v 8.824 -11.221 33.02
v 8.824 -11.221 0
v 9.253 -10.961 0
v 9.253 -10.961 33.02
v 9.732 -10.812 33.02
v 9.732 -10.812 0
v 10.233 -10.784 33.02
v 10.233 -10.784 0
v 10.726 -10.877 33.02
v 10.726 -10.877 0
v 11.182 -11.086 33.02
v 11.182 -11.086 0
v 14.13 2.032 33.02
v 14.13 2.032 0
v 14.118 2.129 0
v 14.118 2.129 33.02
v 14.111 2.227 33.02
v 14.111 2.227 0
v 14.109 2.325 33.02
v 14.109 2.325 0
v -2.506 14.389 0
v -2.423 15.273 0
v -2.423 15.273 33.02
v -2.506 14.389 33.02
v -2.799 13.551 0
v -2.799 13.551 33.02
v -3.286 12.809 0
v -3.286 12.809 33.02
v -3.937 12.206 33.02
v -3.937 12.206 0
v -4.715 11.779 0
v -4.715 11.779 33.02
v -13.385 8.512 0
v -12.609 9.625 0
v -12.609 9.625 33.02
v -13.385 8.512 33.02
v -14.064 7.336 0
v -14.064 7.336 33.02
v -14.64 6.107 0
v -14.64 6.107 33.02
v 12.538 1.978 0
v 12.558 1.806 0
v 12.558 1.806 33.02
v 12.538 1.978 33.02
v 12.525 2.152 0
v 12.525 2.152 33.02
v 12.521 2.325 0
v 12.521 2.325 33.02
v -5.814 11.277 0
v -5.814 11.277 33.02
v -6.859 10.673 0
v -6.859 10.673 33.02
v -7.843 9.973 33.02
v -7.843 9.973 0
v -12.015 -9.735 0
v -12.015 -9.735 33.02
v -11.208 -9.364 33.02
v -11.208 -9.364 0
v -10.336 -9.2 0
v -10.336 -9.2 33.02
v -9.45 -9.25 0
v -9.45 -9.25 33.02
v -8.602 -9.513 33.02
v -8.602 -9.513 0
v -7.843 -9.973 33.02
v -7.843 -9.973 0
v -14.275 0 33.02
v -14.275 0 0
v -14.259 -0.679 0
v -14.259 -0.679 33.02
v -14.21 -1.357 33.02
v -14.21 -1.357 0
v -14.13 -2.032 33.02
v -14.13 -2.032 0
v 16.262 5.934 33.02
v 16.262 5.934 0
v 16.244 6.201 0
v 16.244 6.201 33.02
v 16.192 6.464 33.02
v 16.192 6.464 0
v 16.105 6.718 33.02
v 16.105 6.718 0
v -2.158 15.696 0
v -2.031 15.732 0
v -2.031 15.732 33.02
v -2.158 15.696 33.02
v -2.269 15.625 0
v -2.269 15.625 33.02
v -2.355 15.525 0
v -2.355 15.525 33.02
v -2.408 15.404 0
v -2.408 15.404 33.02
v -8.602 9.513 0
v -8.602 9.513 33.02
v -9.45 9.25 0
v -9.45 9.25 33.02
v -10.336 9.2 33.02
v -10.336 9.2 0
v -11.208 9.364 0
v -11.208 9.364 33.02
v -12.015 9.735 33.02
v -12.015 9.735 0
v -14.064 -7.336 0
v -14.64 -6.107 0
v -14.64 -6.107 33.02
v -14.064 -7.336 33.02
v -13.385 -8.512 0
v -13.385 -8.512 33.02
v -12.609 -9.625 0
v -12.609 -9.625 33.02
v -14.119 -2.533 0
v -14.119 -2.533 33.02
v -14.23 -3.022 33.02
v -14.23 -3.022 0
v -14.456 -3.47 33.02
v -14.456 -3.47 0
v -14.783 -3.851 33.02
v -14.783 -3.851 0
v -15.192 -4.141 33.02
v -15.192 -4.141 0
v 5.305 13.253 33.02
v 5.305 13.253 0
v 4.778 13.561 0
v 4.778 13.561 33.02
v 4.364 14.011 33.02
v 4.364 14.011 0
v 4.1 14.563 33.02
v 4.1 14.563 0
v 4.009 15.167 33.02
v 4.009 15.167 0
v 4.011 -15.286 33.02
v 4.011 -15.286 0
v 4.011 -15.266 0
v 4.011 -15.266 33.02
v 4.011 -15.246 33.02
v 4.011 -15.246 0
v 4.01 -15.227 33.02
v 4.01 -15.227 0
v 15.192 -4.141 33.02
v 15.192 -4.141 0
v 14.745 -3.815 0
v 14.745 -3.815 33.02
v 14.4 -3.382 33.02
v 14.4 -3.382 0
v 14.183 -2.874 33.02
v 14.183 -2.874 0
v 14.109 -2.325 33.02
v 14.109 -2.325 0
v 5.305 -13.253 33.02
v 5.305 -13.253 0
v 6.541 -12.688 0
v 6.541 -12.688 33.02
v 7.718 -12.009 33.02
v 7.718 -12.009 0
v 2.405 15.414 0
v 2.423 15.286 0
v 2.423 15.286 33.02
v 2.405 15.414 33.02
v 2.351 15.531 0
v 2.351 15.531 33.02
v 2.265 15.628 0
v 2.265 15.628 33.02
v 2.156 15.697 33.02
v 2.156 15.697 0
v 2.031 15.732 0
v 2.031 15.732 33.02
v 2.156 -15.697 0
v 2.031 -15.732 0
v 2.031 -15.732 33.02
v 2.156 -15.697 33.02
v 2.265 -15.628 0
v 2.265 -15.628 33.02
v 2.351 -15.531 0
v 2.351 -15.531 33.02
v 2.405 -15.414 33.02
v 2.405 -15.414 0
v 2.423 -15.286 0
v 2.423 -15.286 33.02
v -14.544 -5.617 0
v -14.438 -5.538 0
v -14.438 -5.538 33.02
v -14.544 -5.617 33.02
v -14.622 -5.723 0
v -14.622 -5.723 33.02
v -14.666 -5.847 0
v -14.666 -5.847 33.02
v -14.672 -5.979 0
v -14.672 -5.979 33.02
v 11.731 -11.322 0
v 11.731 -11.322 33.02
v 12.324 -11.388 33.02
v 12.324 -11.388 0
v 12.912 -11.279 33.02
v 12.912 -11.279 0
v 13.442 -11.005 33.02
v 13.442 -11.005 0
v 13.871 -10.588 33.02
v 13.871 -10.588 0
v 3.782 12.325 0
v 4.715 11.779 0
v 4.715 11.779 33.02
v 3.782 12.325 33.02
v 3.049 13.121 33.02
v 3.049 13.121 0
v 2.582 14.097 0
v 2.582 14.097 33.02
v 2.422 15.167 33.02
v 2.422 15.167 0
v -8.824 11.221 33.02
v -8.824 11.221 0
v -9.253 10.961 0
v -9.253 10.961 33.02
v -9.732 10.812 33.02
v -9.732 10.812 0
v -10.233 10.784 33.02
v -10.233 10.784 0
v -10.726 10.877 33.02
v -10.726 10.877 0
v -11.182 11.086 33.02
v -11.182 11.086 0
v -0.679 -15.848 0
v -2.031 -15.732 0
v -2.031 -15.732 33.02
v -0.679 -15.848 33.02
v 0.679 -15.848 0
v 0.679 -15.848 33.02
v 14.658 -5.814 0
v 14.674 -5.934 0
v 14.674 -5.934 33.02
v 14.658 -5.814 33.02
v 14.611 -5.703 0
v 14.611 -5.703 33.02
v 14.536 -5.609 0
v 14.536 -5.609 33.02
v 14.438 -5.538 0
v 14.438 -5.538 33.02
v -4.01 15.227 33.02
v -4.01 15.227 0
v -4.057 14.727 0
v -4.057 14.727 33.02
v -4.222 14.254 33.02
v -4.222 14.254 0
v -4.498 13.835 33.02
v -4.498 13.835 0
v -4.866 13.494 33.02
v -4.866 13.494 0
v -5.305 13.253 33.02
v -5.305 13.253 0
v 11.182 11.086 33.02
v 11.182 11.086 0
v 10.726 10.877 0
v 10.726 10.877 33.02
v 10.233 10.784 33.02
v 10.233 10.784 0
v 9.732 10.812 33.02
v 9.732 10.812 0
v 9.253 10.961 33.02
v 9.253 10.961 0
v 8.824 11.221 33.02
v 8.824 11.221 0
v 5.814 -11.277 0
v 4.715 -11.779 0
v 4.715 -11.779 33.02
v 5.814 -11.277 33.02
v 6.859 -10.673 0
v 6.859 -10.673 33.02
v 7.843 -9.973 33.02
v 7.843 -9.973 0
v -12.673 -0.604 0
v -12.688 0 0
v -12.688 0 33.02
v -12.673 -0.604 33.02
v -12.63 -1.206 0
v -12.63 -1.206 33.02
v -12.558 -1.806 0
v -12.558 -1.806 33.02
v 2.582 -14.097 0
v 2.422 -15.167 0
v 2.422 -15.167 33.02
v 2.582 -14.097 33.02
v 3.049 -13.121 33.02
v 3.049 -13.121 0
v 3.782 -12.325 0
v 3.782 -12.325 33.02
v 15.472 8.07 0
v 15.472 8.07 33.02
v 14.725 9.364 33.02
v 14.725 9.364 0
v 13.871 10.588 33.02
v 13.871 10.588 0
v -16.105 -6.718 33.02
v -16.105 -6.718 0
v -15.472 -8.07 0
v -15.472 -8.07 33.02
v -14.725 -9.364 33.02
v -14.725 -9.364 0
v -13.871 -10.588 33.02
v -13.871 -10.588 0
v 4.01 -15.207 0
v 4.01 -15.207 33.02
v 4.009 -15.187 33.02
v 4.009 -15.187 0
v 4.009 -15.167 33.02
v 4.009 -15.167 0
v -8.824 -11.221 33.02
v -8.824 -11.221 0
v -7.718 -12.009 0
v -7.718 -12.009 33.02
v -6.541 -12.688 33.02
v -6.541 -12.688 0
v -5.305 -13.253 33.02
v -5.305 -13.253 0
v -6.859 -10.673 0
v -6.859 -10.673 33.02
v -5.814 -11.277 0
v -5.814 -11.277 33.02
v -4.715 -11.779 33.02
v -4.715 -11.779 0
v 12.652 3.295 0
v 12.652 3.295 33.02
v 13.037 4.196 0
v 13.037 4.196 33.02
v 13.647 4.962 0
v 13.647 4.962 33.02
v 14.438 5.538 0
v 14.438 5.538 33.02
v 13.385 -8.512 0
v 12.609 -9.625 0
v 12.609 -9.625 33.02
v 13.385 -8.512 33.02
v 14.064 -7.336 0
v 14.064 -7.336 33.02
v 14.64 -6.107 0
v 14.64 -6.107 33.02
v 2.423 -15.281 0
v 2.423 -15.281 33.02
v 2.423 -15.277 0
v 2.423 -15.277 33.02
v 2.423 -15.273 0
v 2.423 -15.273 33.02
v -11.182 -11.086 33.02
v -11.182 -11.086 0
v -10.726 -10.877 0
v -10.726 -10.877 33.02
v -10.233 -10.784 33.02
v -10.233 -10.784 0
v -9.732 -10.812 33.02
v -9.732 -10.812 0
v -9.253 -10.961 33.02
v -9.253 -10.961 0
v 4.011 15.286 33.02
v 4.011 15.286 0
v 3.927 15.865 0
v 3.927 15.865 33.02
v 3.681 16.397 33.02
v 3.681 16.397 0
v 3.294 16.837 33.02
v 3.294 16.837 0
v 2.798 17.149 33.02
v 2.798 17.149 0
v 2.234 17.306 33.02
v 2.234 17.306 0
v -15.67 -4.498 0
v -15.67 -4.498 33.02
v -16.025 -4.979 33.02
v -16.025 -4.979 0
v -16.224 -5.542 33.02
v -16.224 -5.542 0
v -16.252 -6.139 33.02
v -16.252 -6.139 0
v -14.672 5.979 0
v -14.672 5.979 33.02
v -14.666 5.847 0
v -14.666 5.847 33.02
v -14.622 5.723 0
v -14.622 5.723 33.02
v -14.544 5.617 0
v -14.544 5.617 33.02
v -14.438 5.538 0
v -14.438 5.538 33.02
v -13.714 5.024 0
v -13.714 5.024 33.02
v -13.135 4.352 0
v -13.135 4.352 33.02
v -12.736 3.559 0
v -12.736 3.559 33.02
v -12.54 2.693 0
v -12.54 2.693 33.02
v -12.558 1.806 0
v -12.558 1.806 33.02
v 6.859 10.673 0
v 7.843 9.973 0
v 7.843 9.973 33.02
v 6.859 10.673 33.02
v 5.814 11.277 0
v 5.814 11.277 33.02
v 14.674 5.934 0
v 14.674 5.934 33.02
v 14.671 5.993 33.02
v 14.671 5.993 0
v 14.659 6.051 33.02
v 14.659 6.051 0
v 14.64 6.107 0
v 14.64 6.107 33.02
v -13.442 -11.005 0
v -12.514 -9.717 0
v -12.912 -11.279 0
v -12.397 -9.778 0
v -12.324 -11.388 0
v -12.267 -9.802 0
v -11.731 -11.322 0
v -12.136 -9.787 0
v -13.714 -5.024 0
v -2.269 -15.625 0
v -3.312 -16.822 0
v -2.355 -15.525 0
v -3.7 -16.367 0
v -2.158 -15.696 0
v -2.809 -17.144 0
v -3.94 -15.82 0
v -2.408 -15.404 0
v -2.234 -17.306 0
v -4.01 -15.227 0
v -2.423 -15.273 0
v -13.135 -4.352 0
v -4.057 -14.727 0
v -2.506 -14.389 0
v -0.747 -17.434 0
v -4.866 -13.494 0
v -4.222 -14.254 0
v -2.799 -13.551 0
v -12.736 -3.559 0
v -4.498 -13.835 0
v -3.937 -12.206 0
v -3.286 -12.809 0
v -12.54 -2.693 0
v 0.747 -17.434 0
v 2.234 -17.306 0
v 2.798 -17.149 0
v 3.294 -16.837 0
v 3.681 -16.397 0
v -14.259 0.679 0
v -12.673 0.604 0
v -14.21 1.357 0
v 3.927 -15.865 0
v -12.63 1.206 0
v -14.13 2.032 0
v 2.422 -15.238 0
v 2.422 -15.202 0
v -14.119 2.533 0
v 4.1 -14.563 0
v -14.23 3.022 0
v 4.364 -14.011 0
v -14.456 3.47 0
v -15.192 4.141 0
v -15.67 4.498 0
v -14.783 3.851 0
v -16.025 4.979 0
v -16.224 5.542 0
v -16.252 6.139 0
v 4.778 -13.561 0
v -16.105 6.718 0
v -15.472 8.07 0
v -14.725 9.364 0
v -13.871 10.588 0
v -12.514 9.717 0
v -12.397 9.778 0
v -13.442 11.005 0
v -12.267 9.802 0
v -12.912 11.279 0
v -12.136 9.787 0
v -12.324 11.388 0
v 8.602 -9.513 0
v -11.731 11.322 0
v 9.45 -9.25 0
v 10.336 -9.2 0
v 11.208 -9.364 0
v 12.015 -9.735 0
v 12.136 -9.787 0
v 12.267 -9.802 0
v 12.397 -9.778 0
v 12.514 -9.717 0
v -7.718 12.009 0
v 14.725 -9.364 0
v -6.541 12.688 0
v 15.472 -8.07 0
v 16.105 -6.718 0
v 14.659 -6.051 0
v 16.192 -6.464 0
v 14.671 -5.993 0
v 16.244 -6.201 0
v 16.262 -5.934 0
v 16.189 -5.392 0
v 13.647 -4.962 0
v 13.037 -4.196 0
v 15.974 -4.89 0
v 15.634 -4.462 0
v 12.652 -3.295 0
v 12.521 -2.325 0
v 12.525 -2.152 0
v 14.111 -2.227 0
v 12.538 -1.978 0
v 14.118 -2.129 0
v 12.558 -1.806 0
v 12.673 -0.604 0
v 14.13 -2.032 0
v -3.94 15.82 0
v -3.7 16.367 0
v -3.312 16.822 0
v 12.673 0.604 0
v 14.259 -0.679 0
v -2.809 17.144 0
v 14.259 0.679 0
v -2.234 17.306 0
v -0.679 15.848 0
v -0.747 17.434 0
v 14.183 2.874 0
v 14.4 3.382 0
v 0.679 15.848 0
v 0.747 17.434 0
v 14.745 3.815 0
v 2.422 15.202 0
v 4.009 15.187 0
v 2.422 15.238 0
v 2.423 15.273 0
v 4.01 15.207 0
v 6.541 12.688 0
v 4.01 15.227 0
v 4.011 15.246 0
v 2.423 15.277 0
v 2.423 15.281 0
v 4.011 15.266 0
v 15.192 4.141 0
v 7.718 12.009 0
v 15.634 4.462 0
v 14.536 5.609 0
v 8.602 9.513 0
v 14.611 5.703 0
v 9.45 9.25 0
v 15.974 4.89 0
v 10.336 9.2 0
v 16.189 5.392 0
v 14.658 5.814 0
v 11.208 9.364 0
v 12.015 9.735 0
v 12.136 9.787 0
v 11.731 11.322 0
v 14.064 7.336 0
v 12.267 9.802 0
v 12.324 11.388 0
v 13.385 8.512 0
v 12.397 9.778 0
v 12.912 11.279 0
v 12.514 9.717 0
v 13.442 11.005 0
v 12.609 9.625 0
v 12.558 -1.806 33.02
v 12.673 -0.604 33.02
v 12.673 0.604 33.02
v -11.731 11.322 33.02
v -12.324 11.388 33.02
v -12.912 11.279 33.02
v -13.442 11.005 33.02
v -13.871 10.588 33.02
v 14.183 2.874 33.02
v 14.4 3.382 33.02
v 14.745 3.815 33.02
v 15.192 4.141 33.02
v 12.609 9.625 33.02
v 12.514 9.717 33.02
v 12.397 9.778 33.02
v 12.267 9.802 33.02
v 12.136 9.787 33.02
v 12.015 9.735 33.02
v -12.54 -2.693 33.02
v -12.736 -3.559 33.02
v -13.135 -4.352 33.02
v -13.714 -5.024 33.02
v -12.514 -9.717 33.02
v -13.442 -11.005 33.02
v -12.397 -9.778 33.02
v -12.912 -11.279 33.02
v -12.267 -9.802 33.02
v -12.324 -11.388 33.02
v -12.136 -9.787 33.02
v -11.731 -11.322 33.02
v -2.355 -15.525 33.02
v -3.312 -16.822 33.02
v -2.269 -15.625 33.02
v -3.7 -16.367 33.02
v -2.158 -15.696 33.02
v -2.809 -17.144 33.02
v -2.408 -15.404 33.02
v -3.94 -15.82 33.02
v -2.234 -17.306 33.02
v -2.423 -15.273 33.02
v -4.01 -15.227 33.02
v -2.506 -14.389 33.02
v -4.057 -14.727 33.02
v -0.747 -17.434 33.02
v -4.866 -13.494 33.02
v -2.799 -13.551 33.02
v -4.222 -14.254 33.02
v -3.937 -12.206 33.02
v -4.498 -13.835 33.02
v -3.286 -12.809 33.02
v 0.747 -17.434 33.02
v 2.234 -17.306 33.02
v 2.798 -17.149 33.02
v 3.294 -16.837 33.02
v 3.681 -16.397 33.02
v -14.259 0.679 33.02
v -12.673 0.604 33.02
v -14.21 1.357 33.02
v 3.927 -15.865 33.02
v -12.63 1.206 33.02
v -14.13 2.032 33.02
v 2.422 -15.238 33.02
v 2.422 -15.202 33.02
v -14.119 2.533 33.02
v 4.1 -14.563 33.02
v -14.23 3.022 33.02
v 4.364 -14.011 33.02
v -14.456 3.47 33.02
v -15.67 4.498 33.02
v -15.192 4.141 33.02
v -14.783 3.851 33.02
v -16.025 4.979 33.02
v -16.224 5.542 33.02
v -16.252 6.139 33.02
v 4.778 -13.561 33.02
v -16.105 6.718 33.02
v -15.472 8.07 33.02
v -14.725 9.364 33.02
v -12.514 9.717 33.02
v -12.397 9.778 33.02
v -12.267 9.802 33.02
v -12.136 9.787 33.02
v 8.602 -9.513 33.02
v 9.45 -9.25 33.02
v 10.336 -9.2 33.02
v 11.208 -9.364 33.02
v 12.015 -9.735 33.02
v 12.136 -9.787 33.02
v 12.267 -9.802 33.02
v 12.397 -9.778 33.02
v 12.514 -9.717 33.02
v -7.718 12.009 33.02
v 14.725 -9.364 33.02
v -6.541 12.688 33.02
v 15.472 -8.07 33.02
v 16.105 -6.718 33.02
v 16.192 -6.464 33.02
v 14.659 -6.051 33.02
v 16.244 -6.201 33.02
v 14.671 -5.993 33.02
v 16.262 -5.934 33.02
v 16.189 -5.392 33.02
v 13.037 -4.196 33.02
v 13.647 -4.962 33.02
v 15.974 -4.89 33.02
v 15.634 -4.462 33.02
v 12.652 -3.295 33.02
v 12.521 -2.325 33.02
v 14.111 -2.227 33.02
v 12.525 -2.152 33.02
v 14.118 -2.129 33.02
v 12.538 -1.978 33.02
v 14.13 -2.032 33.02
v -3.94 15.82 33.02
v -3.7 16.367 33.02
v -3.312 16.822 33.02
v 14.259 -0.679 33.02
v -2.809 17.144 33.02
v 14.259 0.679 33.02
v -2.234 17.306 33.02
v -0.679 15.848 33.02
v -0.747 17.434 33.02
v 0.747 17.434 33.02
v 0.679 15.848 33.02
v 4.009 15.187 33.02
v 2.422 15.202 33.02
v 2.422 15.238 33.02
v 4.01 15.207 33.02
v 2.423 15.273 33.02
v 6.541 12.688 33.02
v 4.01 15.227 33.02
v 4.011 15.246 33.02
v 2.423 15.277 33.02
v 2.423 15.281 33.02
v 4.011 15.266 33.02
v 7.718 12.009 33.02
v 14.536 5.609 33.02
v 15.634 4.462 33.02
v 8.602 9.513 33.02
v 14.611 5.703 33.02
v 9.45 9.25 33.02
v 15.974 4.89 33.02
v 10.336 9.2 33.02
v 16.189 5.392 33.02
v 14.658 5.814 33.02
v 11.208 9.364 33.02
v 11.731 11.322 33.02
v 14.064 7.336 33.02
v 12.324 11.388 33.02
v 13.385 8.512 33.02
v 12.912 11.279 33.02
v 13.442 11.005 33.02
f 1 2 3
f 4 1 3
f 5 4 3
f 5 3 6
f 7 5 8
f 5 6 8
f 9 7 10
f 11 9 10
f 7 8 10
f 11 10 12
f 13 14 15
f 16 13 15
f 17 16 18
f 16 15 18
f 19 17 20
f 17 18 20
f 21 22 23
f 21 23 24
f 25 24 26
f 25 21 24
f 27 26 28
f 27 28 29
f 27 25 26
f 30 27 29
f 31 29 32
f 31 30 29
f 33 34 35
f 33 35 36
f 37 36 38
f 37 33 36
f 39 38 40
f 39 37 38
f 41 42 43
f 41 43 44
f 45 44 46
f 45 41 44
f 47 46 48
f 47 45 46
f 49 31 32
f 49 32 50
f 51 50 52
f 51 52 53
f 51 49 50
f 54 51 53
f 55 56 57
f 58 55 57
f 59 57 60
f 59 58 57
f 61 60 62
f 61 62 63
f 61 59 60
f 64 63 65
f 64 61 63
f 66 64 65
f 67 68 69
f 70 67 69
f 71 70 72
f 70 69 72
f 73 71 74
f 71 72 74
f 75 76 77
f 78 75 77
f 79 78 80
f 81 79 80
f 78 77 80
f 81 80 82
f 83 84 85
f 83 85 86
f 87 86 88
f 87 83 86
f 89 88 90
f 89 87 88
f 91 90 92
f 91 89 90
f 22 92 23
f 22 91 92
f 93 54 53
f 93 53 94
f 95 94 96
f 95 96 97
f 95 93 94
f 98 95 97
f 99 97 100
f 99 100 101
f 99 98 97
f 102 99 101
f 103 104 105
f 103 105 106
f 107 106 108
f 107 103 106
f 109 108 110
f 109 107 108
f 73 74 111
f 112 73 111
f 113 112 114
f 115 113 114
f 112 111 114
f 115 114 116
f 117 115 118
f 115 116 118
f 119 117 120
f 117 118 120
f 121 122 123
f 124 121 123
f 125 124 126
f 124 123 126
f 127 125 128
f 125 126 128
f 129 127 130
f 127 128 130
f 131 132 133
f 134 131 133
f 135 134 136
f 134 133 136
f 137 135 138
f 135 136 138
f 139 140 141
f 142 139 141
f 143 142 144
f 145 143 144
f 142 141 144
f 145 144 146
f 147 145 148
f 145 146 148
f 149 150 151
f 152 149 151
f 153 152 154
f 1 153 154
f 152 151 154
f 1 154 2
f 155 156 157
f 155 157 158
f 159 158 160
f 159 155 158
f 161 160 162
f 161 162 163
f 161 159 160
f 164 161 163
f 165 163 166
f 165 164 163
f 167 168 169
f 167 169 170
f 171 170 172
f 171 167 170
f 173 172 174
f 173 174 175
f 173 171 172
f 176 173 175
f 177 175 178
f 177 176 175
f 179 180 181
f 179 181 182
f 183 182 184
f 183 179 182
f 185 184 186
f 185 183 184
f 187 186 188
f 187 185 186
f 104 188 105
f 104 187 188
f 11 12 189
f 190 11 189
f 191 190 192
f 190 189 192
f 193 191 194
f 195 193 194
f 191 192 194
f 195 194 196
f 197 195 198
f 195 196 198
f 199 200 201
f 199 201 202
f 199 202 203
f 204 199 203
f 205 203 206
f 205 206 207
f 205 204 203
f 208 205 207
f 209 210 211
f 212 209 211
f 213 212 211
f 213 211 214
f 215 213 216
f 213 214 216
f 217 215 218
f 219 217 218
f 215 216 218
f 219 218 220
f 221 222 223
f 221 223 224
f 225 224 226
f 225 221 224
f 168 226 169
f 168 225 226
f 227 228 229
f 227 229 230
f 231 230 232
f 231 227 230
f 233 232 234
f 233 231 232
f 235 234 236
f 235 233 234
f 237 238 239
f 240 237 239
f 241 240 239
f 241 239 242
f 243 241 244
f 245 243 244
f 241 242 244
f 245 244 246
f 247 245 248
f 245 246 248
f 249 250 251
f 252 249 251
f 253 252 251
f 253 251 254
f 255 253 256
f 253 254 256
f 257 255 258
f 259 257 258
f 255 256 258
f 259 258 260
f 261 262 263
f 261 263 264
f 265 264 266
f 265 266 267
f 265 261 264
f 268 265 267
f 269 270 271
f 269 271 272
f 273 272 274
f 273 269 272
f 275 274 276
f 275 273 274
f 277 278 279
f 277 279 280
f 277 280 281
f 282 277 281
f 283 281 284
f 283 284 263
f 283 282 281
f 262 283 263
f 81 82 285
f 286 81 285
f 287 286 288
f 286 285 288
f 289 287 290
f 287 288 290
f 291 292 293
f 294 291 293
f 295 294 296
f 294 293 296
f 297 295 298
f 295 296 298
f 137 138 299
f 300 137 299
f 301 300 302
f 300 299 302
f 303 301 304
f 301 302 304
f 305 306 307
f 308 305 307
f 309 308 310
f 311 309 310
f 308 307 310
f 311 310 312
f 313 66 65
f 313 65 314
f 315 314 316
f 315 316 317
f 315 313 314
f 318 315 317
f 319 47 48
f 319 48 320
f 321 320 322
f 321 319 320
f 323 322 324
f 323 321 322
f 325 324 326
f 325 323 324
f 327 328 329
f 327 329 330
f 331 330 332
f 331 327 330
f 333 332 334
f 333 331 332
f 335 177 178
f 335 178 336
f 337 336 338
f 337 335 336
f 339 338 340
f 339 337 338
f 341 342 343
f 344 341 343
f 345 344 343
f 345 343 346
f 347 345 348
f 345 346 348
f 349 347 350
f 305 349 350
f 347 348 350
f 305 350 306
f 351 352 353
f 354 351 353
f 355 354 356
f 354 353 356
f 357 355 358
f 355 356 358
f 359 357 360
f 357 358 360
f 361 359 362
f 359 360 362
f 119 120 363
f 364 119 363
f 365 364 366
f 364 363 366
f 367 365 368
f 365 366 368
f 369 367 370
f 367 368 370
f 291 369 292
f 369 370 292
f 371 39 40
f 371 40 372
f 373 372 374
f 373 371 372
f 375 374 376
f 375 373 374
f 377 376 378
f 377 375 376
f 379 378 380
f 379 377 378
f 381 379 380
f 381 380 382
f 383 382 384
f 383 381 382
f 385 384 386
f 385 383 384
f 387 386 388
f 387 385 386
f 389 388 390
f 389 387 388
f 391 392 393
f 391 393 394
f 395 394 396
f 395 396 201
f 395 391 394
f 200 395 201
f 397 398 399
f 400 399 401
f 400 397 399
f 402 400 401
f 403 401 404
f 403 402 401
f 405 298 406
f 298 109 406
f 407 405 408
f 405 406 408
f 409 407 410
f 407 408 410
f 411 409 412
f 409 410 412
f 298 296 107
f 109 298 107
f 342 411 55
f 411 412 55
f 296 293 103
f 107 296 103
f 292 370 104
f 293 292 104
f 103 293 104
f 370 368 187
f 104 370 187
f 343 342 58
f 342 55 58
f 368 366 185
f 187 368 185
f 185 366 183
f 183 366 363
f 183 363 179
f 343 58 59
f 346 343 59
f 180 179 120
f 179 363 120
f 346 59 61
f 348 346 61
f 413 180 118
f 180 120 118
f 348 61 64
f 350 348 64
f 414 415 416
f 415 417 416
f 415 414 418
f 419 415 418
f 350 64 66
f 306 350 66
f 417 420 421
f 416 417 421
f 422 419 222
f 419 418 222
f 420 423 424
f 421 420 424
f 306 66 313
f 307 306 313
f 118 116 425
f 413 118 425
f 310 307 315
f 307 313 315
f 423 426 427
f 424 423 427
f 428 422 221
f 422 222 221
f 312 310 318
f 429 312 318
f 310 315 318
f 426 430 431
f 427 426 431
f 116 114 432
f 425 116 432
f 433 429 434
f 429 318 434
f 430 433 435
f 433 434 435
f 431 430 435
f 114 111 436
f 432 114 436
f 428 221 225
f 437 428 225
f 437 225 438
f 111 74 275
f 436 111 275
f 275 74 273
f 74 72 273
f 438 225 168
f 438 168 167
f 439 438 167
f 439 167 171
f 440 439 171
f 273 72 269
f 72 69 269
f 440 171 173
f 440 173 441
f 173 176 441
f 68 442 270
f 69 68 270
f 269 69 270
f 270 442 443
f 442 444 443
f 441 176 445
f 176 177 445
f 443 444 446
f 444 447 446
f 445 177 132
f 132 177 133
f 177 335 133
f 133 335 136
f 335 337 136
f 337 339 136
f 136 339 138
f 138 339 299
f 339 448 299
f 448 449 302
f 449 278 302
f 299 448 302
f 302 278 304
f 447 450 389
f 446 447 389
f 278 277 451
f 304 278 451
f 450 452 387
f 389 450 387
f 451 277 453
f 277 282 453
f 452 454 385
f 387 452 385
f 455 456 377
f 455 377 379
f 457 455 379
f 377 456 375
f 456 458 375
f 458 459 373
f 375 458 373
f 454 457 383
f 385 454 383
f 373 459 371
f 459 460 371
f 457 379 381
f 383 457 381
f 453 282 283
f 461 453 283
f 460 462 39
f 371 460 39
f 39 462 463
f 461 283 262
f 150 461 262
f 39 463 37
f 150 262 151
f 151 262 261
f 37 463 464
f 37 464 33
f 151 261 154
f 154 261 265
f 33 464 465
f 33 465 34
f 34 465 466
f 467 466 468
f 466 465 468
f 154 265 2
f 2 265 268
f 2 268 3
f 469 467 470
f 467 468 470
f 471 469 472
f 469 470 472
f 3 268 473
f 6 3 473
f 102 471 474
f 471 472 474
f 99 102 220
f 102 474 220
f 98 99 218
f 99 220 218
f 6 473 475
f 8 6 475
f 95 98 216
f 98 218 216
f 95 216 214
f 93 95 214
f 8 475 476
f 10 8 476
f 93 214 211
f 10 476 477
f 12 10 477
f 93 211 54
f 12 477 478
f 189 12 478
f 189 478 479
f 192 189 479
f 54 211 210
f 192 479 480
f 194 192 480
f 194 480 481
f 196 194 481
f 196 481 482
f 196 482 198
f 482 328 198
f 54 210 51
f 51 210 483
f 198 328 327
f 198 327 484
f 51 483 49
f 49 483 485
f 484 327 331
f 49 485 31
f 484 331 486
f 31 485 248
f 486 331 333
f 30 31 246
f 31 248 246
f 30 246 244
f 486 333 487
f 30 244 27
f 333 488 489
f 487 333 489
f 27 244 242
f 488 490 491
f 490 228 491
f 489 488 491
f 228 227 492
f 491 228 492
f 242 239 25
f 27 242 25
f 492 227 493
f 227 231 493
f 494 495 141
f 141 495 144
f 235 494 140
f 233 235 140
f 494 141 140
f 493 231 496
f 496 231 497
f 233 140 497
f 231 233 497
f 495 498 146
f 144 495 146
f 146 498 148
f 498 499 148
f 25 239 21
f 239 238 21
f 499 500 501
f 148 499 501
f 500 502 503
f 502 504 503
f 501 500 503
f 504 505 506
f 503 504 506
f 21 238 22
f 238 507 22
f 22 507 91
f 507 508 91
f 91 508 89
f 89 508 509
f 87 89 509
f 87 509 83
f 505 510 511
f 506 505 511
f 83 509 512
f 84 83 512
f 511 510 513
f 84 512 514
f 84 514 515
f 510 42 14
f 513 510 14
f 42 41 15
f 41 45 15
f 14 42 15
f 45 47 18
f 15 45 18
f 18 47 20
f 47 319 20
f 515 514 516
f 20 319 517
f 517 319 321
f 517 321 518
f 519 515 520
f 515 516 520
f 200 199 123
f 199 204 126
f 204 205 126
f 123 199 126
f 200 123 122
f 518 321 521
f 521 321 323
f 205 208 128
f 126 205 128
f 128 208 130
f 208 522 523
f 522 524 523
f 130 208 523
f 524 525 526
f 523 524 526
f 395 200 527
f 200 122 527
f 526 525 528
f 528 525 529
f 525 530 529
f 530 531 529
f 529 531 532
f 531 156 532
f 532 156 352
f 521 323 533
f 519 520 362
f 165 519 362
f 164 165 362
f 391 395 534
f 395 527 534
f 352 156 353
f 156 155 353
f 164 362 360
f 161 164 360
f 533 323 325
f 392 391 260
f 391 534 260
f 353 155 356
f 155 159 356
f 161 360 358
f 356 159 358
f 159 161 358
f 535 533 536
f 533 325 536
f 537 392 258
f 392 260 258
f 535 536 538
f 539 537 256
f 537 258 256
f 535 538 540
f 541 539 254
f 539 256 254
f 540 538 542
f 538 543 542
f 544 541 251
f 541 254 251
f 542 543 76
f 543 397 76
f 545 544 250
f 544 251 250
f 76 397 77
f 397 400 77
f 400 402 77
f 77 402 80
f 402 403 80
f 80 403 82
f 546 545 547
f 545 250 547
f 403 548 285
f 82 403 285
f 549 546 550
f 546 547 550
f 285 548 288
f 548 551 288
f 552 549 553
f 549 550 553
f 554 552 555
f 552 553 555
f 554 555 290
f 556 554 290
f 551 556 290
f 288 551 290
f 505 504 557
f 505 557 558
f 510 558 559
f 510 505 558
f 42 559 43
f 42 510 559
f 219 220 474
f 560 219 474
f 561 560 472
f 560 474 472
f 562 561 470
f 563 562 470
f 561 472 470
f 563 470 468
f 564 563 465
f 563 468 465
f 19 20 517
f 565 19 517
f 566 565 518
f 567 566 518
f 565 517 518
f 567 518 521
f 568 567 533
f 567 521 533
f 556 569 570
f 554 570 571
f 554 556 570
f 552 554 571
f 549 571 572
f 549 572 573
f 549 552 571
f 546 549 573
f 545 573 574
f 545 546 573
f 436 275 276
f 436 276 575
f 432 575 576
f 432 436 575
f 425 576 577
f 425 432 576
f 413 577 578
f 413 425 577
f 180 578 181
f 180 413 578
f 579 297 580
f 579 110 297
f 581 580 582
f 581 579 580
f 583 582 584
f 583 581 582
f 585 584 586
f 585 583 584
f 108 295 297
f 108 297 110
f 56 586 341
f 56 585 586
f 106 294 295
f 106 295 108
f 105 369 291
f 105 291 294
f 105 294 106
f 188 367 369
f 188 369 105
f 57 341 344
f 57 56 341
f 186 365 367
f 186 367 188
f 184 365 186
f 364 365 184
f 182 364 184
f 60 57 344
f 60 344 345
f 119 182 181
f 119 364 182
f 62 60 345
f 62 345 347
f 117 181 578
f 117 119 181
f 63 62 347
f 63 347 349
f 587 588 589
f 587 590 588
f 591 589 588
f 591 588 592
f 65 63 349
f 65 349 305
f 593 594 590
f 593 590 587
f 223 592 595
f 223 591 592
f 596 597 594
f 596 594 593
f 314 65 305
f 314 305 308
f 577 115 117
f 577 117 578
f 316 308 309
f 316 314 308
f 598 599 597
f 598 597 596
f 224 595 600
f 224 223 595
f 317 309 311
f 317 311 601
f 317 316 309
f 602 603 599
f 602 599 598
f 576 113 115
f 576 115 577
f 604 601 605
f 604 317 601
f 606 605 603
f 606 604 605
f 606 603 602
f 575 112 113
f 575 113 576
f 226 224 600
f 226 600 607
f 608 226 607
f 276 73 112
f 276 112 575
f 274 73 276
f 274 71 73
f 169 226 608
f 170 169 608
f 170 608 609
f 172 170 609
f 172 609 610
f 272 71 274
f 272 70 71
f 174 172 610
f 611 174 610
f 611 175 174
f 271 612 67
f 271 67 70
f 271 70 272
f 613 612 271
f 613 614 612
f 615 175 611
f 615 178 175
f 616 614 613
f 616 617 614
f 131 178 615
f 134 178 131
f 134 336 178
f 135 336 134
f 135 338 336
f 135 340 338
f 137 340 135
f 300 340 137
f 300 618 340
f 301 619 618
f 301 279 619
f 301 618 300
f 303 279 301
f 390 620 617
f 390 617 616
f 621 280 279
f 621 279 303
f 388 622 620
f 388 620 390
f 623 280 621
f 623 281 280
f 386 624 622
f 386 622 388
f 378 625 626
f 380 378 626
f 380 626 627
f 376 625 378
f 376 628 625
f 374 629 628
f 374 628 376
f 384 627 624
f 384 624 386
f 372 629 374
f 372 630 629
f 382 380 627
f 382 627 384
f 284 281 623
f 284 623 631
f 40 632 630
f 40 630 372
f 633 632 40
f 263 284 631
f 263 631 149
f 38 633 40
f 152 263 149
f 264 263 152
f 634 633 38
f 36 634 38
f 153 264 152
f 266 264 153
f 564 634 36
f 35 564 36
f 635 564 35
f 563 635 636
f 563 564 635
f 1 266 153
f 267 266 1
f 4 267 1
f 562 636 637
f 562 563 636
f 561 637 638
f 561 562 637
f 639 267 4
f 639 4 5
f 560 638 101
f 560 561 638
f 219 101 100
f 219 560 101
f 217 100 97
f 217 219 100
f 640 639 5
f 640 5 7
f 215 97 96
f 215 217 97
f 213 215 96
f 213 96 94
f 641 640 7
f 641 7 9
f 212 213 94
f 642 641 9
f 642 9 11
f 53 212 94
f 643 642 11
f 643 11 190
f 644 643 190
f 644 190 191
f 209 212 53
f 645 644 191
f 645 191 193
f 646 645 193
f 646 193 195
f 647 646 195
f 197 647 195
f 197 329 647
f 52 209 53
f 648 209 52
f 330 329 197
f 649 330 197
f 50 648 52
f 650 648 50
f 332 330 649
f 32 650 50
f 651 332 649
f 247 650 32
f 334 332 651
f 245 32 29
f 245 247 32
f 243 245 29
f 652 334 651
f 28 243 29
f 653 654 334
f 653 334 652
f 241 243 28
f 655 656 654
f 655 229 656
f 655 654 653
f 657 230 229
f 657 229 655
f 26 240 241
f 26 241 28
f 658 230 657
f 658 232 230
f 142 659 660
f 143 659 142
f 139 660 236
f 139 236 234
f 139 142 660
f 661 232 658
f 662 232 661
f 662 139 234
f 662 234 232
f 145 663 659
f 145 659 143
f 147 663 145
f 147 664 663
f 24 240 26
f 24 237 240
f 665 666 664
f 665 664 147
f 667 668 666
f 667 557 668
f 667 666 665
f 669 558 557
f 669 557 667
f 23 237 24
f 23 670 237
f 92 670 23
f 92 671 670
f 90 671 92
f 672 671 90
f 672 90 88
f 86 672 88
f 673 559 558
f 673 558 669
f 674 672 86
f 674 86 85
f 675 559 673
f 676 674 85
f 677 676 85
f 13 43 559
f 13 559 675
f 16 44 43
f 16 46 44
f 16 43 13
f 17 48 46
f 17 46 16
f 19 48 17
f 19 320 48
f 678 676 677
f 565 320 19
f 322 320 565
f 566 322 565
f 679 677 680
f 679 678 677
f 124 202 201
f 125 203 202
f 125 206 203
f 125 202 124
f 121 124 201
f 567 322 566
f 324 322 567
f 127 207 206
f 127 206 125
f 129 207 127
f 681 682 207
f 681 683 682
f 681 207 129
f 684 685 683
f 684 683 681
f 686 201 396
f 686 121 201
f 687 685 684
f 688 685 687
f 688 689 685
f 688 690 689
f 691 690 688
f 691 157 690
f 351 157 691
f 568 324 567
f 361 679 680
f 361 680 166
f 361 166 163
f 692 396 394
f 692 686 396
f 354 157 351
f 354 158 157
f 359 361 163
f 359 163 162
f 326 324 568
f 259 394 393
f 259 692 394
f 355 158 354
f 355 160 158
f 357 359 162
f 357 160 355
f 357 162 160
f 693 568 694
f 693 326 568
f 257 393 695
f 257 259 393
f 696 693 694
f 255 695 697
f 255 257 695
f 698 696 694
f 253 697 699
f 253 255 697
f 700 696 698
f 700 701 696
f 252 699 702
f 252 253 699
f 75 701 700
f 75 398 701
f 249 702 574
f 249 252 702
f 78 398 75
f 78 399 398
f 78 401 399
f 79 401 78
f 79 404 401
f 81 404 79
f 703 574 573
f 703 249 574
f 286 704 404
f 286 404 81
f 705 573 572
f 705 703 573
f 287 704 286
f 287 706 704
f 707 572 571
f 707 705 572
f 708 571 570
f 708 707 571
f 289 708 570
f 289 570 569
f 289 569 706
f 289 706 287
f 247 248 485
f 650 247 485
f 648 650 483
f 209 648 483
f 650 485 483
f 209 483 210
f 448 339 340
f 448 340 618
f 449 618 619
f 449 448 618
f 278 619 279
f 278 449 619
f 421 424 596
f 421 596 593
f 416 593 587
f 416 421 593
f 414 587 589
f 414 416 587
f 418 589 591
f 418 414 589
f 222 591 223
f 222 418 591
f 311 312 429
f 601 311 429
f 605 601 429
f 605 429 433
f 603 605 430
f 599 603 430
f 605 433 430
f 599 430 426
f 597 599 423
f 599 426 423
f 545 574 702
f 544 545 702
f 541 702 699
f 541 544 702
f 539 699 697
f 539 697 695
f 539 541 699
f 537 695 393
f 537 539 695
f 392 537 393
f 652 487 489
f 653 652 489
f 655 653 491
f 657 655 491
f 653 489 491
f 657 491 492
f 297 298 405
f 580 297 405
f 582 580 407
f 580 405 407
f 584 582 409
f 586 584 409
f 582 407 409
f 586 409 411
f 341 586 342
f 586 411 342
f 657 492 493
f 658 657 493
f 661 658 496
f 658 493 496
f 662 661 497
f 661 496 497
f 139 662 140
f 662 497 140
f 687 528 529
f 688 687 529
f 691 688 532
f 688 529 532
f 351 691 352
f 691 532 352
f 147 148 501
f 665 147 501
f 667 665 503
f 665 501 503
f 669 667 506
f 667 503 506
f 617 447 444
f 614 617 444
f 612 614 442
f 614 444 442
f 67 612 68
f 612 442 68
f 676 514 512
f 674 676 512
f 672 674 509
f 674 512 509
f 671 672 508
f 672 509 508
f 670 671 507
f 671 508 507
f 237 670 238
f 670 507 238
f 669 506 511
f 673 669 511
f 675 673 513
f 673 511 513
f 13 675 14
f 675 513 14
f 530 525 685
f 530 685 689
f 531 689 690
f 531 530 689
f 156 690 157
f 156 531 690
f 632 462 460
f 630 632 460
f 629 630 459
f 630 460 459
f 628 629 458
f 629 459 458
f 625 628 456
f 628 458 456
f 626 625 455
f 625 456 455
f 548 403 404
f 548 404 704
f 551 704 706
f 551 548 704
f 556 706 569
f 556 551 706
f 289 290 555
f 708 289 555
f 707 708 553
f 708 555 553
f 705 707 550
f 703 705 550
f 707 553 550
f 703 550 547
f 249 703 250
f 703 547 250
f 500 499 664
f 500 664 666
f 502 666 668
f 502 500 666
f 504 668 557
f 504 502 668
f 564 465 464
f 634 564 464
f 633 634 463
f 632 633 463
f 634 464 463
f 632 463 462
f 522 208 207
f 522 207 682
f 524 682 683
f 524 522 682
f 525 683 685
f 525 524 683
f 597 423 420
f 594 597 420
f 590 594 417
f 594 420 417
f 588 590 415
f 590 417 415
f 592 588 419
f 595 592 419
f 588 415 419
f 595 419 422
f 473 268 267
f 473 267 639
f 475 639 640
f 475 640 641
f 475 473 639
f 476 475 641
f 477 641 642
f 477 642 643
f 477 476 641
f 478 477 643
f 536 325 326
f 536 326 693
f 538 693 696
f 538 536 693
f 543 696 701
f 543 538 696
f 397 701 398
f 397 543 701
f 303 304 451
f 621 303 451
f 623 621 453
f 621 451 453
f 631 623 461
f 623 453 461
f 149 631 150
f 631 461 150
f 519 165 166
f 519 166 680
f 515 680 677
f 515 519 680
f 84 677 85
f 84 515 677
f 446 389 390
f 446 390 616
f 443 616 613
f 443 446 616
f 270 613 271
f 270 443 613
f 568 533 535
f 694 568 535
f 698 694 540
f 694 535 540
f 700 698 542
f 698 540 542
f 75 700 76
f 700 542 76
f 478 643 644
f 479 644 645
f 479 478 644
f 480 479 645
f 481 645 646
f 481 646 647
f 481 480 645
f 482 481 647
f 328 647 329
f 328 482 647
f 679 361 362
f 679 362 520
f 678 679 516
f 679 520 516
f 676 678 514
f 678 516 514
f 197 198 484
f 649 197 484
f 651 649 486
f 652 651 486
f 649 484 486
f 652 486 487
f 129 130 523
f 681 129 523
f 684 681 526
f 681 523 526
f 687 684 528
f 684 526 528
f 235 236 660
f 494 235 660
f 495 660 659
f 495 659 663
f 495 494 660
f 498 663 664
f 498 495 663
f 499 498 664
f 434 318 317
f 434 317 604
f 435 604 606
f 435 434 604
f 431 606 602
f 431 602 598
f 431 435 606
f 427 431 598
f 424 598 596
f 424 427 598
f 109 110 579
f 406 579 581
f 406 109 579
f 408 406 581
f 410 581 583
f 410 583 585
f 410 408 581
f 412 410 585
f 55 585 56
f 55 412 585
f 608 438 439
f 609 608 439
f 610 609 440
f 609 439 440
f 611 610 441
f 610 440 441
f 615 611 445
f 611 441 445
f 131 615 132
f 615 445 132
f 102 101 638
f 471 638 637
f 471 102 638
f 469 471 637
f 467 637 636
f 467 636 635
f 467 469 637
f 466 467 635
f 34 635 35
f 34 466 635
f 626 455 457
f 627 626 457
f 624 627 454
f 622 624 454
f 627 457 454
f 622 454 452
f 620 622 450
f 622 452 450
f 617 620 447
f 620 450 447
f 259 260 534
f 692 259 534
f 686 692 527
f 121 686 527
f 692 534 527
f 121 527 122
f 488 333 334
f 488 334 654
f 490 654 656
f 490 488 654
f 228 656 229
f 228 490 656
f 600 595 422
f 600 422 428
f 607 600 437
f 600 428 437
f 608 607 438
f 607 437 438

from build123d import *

# Parameters (mm, degrees)
BOSS_EXTRUDE1_DEPTH = 33.02


with BuildPart() as part:
    # Sketch1 → Boss-Extrude1 (new body)
    with BuildSketch(Plane.XY):
        with BuildLine():
            ThreePointArc((-5.305232227, 13.252552057), (-7.1375, 12.362512639), (-8.824430633, 11.22074191))
            ThreePointArc((-8.824430633, 11.22074191), (-9.981957879, 10.782799599), (-11.181776449, 11.08627644))
            ThreePointArc((-11.181776449, 11.08627644), (-12.622148396, 11.355295802), (-13.870578082, 10.588180375))
            ThreePointArc((-13.870578082, 10.588180375), (-15.112143296, 8.725), (-16.104922226, 6.718182797))
            ThreePointArc((-16.104922226, 6.718182797), (-16.145048829, 5.25345326), (-15.191885255, 4.140564245))
            ThreePointArc((-15.191885255, 4.140564245), (-14.329157316, 3.253229304), (-14.12966286, 2.031810147))
            ThreePointArc((-14.12966286, 2.031810147), (-14.238619356, 1.01850078), (-14.275, 0))
            ThreePointArc((-14.275, 0), (-14.238619356, -1.01850078), (-14.12966286, -2.031810147))
            ThreePointArc((-14.12966286, -2.031810147), (-14.329157316, -3.253229304), (-15.191885255, -4.140564245))
            ThreePointArc((-15.191885255, -4.140564245), (-16.145048829, -5.25345326), (-16.104922226, -6.718182797))
            ThreePointArc((-16.104922226, -6.718182797), (-15.112143296, -8.725), (-13.870578082, -10.588180375))
            ThreePointArc((-13.870578082, -10.588180375), (-12.622148396, -11.355295802), (-11.181776449, -11.08627644))
            ThreePointArc((-11.181776449, -11.08627644), (-9.981957879, -10.782799599), (-8.824430633, -11.22074191))
            ThreePointArc((-8.824430633, -11.22074191), (-7.1375, -12.362512639), (-5.305232227, -13.252552057))
            ThreePointArc((-5.305232227, -13.252552057), (-4.347199437, -14.036028902), (-4.010108806, -15.226840684))
            ThreePointArc((-4.010108806, -15.226840684), (-3.522900434, -16.608749062), (-2.234344144, -17.306363172))
            ThreePointArc((-2.234344144, -17.306363172), (0, -17.45), (2.234344144, -17.306363172))
            ThreePointArc((2.234344144, -17.306363172), (3.503647323, -16.630968906), (4.010957256, -15.285634521))
            ThreePointArc((4.010957256, -15.285634521), (4.010745132, -15.256234542), (4.010108806, -15.226840684))
            ThreePointArc((4.010108806, -15.226840684), (4.009464671, -15.197086165), (4.009249945, -15.167325448))
            ThreePointArc((4.009249945, -15.167325448), (4.363702952, -14.011262386), (5.305232227, -13.252552057))
            ThreePointArc((5.305232227, -13.252552057), (7.1375, -12.362512639), (8.824430633, -11.22074191))
            ThreePointArc((8.824430633, -11.22074191), (9.981957879, -10.782799599), (11.181776449, -11.08627644))
            ThreePointArc((11.181776449, -11.08627644), (12.622148396, -11.355295802), (13.870578082, -10.588180375))
            ThreePointArc((13.870578082, -10.588180375), (15.112143296, -8.725), (16.104922226, -6.718182797))
            ThreePointArc((16.104922226, -6.718182797), (16.2223271, -6.333751864), (16.261976436, -5.933753144))
            ThreePointArc((16.261976436, -5.933753144), (15.974119502, -4.889648077), (15.191885255, -4.140564245))
            ThreePointArc((15.191885255, -4.140564245), (14.400052997, -3.382289157), (14.10866406, -2.325372926))
            ThreePointArc((14.10866406, -2.325372926), (14.113920458, -2.1782165), (14.12966286, -2.031810147))
            ThreePointArc((14.12966286, -2.031810147), (14.275, 0), (14.12966286, 2.031810147))
            ThreePointArc((14.12966286, 2.031810147), (14.113920458, 2.1782165), (14.10866406, 2.325372926))
            ThreePointArc((14.10866406, 2.325372926), (14.400052997, 3.382289157), (15.191885255, 4.140564245))
            ThreePointArc((15.191885255, 4.140564245), (15.974119502, 4.889648077), (16.261976436, 5.933753144))
            ThreePointArc((16.261976436, 5.933753144), (16.2223271, 6.333751864), (16.104922226, 6.718182797))
            ThreePointArc((16.104922226, 6.718182797), (15.112143296, 8.725), (13.870578082, 10.588180375))
            ThreePointArc((13.870578082, 10.588180375), (12.622148396, 11.355295802), (11.181776449, 11.08627644))
            ThreePointArc((11.181776449, 11.08627644), (9.981957879, 10.782799599), (8.824430633, 11.22074191))
            ThreePointArc((8.824430633, 11.22074191), (7.1375, 12.362512639), (5.305232227, 13.252552057))
            ThreePointArc((5.305232227, 13.252552057), (4.363702952, 14.011262386), (4.009249945, 15.167325448))
            ThreePointArc((4.009249945, 15.167325448), (4.009464671, 15.197086165), (4.010108806, 15.226840684))
            ThreePointArc((4.010108806, 15.226840684), (4.010745132, 15.256234542), (4.010957256, 15.285634521))
            ThreePointArc((4.010957256, 15.285634521), (3.503647323, 16.630968906), (2.234344144, 17.306363172))
            ThreePointArc((2.234344144, 17.306363172), (0, 17.45), (-2.234344144, 17.306363172))
            ThreePointArc((-2.234344144, 17.306363172), (-3.522900434, 16.608749062), (-4.010108806, 15.226840684))
            ThreePointArc((-4.010108806, 15.226840684), (-4.347199437, 14.036028902), (-5.305232227, 13.252552057))
        make_face()
        with BuildLine():
            ThreePointArc((-4.715245806, 11.778756863), (-6.34375, 10.987697311), (-7.843079766, 9.972901084))
            ThreePointArc((-7.843079766, 9.972901084), (-9.891552176, 9.197875923), (-12.014867411, 9.734937956))
            ThreePointArc((-12.014867411, 9.734937956), (-12.332986369, 9.794353275), (-12.608713171, 9.624929009))
            ThreePointArc((-12.608713171, 9.624929009), (-13.737327968, 7.93125), (-14.639789617, 6.107001411))
            ThreePointArc((-14.639789617, 6.107001411), (-14.648651934, 5.783502863), (-14.438137279, 5.537711424))
            ThreePointArc((-14.438137279, 5.537711424), (-12.911370298, 3.967397506), (-12.558325571, 1.805855779))
            ThreePointArc((-12.558325571, 1.805855779), (-12.655165189, 0.905234932), (-12.6875, 0))
            ThreePointArc((-12.6875, 0), (-12.655165189, -0.905234932), (-12.558325571, -1.805855779))
            ThreePointArc((-12.558325571, -1.805855779), (-12.911370298, -3.967397506), (-14.438137279, -5.537711424))
            ThreePointArc((-14.438137279, -5.537711424), (-14.648651934, -5.783502863), (-14.639789617, -6.107001411))
            ThreePointArc((-14.639789617, -6.107001411), (-13.737327968, -7.93125), (-12.608713171, -9.624929009))
            ThreePointArc((-12.608713171, -9.624929009), (-12.332986369, -9.794353275), (-12.014867411, -9.734937956))
            ThreePointArc((-12.014867411, -9.734937956), (-9.891552176, -9.197875923), (-7.843079766, -9.972901084))
            ThreePointArc((-7.843079766, -9.972901084), (-6.34375, -10.987697311), (-4.715245806, -11.778756863))
            ThreePointArc((-4.715245806, -11.778756863), (-3.019818122, -13.165273429), (-2.423269868, -15.272649379))
            ThreePointArc((-2.423269868, -15.272649379), (-2.315665565, -15.577856137), (-2.031076446, -15.731930419))
            ThreePointArc((-2.031076446, -15.731930419), (0, -15.8625), (2.031076446, -15.731930419))
            ThreePointArc((2.031076446, -15.731930419), (2.311413344, -15.582763588), (2.423457256, -15.285634521))
            ThreePointArc((2.423457256, -15.285634521), (2.423410406, -15.279141274), (2.423269868, -15.272649379))
            ThreePointArc((2.423269868, -15.272649379), (2.422129945, -15.219992897), (2.421749945, -15.167325448))
            ThreePointArc((2.421749945, -15.167325448), (3.049024342, -13.1214442), (4.715245806, -11.778756863))
            ThreePointArc((4.715245806, -11.778756863), (6.34375, -10.987697311), (7.843079766, -9.972901084))
            ThreePointArc((7.843079766, -9.972901084), (9.891552176, -9.197875923), (12.014867411, -9.734937956))
            ThreePointArc((12.014867411, -9.734937956), (12.332986369, -9.794353275), (12.608713171, -9.624929009))
            ThreePointArc((12.608713171, -9.624929009), (13.737327968, -7.93125), (14.639789617, -6.107001411))
            ThreePointArc((14.639789617, -6.107001411), (14.665719527, -6.022096419), (14.674476436, -5.933753144))
            ThreePointArc((14.674476436, -5.933753144), (14.610900672, -5.703153252), (14.438137279, -5.537711424))
            ThreePointArc((14.438137279, -5.537711424), (13.036834166, -4.195794332), (12.52116406, -2.325372926))
            ThreePointArc((12.52116406, -2.325372926), (12.530466291, -2.064950652), (12.558325571, -1.805855779))
            ThreePointArc((12.558325571, -1.805855779), (12.6875, 0), (12.558325571, 1.805855779))
            ThreePointArc((12.558325571, 1.805855779), (12.530466291, 2.064950652), (12.52116406, 2.325372926))
            ThreePointArc((12.52116406, 2.325372926), (13.036834166, 4.195794332), (14.438137279, 5.537711424))
            ThreePointArc((14.438137279, 5.537711424), (14.610900672, 5.703153252), (14.674476436, 5.933753144))
            ThreePointArc((14.674476436, 5.933753144), (14.665719527, 6.022096419), (14.639789617, 6.107001411))
            ThreePointArc((14.639789617, 6.107001411), (13.737327968, 7.93125), (12.608713171, 9.624929009))
            ThreePointArc((12.608713171, 9.624929009), (12.332986369, 9.794353275), (12.014867411, 9.734937956))
            ThreePointArc((12.014867411, 9.734937956), (9.891552176, 9.197875923), (7.843079766, 9.972901084))
            ThreePointArc((7.843079766, 9.972901084), (6.34375, 10.987697311), (4.715245806, 11.778756863))
            ThreePointArc((4.715245806, 11.778756863), (3.049024342, 13.1214442), (2.421749945, 15.167325448))
            ThreePointArc((2.421749945, 15.167325448), (2.422129945, 15.219992897), (2.423269868, 15.272649379))
            ThreePointArc((2.423269868, 15.272649379), (2.423410406, 15.279141274), (2.423457256, 15.285634521))
            ThreePointArc((2.423457256, 15.285634521), (2.311413344, 15.582763588), (2.031076446, 15.731930419))
            ThreePointArc((2.031076446, 15.731930419), (0, 15.8625), (-2.031076446, 15.731930419))
            ThreePointArc((-2.031076446, 15.731930419), (-2.315665565, 15.577856137), (-2.423269868, 15.272649379))
            ThreePointArc((-2.423269868, 15.272649379), (-3.019818122, 13.165273429), (-4.715245806, 11.778756863))
        make_face(mode=Mode.SUBTRACT)
    extrude(amount=BOSS_EXTRUDE1_DEPTH)


solid = part.part
